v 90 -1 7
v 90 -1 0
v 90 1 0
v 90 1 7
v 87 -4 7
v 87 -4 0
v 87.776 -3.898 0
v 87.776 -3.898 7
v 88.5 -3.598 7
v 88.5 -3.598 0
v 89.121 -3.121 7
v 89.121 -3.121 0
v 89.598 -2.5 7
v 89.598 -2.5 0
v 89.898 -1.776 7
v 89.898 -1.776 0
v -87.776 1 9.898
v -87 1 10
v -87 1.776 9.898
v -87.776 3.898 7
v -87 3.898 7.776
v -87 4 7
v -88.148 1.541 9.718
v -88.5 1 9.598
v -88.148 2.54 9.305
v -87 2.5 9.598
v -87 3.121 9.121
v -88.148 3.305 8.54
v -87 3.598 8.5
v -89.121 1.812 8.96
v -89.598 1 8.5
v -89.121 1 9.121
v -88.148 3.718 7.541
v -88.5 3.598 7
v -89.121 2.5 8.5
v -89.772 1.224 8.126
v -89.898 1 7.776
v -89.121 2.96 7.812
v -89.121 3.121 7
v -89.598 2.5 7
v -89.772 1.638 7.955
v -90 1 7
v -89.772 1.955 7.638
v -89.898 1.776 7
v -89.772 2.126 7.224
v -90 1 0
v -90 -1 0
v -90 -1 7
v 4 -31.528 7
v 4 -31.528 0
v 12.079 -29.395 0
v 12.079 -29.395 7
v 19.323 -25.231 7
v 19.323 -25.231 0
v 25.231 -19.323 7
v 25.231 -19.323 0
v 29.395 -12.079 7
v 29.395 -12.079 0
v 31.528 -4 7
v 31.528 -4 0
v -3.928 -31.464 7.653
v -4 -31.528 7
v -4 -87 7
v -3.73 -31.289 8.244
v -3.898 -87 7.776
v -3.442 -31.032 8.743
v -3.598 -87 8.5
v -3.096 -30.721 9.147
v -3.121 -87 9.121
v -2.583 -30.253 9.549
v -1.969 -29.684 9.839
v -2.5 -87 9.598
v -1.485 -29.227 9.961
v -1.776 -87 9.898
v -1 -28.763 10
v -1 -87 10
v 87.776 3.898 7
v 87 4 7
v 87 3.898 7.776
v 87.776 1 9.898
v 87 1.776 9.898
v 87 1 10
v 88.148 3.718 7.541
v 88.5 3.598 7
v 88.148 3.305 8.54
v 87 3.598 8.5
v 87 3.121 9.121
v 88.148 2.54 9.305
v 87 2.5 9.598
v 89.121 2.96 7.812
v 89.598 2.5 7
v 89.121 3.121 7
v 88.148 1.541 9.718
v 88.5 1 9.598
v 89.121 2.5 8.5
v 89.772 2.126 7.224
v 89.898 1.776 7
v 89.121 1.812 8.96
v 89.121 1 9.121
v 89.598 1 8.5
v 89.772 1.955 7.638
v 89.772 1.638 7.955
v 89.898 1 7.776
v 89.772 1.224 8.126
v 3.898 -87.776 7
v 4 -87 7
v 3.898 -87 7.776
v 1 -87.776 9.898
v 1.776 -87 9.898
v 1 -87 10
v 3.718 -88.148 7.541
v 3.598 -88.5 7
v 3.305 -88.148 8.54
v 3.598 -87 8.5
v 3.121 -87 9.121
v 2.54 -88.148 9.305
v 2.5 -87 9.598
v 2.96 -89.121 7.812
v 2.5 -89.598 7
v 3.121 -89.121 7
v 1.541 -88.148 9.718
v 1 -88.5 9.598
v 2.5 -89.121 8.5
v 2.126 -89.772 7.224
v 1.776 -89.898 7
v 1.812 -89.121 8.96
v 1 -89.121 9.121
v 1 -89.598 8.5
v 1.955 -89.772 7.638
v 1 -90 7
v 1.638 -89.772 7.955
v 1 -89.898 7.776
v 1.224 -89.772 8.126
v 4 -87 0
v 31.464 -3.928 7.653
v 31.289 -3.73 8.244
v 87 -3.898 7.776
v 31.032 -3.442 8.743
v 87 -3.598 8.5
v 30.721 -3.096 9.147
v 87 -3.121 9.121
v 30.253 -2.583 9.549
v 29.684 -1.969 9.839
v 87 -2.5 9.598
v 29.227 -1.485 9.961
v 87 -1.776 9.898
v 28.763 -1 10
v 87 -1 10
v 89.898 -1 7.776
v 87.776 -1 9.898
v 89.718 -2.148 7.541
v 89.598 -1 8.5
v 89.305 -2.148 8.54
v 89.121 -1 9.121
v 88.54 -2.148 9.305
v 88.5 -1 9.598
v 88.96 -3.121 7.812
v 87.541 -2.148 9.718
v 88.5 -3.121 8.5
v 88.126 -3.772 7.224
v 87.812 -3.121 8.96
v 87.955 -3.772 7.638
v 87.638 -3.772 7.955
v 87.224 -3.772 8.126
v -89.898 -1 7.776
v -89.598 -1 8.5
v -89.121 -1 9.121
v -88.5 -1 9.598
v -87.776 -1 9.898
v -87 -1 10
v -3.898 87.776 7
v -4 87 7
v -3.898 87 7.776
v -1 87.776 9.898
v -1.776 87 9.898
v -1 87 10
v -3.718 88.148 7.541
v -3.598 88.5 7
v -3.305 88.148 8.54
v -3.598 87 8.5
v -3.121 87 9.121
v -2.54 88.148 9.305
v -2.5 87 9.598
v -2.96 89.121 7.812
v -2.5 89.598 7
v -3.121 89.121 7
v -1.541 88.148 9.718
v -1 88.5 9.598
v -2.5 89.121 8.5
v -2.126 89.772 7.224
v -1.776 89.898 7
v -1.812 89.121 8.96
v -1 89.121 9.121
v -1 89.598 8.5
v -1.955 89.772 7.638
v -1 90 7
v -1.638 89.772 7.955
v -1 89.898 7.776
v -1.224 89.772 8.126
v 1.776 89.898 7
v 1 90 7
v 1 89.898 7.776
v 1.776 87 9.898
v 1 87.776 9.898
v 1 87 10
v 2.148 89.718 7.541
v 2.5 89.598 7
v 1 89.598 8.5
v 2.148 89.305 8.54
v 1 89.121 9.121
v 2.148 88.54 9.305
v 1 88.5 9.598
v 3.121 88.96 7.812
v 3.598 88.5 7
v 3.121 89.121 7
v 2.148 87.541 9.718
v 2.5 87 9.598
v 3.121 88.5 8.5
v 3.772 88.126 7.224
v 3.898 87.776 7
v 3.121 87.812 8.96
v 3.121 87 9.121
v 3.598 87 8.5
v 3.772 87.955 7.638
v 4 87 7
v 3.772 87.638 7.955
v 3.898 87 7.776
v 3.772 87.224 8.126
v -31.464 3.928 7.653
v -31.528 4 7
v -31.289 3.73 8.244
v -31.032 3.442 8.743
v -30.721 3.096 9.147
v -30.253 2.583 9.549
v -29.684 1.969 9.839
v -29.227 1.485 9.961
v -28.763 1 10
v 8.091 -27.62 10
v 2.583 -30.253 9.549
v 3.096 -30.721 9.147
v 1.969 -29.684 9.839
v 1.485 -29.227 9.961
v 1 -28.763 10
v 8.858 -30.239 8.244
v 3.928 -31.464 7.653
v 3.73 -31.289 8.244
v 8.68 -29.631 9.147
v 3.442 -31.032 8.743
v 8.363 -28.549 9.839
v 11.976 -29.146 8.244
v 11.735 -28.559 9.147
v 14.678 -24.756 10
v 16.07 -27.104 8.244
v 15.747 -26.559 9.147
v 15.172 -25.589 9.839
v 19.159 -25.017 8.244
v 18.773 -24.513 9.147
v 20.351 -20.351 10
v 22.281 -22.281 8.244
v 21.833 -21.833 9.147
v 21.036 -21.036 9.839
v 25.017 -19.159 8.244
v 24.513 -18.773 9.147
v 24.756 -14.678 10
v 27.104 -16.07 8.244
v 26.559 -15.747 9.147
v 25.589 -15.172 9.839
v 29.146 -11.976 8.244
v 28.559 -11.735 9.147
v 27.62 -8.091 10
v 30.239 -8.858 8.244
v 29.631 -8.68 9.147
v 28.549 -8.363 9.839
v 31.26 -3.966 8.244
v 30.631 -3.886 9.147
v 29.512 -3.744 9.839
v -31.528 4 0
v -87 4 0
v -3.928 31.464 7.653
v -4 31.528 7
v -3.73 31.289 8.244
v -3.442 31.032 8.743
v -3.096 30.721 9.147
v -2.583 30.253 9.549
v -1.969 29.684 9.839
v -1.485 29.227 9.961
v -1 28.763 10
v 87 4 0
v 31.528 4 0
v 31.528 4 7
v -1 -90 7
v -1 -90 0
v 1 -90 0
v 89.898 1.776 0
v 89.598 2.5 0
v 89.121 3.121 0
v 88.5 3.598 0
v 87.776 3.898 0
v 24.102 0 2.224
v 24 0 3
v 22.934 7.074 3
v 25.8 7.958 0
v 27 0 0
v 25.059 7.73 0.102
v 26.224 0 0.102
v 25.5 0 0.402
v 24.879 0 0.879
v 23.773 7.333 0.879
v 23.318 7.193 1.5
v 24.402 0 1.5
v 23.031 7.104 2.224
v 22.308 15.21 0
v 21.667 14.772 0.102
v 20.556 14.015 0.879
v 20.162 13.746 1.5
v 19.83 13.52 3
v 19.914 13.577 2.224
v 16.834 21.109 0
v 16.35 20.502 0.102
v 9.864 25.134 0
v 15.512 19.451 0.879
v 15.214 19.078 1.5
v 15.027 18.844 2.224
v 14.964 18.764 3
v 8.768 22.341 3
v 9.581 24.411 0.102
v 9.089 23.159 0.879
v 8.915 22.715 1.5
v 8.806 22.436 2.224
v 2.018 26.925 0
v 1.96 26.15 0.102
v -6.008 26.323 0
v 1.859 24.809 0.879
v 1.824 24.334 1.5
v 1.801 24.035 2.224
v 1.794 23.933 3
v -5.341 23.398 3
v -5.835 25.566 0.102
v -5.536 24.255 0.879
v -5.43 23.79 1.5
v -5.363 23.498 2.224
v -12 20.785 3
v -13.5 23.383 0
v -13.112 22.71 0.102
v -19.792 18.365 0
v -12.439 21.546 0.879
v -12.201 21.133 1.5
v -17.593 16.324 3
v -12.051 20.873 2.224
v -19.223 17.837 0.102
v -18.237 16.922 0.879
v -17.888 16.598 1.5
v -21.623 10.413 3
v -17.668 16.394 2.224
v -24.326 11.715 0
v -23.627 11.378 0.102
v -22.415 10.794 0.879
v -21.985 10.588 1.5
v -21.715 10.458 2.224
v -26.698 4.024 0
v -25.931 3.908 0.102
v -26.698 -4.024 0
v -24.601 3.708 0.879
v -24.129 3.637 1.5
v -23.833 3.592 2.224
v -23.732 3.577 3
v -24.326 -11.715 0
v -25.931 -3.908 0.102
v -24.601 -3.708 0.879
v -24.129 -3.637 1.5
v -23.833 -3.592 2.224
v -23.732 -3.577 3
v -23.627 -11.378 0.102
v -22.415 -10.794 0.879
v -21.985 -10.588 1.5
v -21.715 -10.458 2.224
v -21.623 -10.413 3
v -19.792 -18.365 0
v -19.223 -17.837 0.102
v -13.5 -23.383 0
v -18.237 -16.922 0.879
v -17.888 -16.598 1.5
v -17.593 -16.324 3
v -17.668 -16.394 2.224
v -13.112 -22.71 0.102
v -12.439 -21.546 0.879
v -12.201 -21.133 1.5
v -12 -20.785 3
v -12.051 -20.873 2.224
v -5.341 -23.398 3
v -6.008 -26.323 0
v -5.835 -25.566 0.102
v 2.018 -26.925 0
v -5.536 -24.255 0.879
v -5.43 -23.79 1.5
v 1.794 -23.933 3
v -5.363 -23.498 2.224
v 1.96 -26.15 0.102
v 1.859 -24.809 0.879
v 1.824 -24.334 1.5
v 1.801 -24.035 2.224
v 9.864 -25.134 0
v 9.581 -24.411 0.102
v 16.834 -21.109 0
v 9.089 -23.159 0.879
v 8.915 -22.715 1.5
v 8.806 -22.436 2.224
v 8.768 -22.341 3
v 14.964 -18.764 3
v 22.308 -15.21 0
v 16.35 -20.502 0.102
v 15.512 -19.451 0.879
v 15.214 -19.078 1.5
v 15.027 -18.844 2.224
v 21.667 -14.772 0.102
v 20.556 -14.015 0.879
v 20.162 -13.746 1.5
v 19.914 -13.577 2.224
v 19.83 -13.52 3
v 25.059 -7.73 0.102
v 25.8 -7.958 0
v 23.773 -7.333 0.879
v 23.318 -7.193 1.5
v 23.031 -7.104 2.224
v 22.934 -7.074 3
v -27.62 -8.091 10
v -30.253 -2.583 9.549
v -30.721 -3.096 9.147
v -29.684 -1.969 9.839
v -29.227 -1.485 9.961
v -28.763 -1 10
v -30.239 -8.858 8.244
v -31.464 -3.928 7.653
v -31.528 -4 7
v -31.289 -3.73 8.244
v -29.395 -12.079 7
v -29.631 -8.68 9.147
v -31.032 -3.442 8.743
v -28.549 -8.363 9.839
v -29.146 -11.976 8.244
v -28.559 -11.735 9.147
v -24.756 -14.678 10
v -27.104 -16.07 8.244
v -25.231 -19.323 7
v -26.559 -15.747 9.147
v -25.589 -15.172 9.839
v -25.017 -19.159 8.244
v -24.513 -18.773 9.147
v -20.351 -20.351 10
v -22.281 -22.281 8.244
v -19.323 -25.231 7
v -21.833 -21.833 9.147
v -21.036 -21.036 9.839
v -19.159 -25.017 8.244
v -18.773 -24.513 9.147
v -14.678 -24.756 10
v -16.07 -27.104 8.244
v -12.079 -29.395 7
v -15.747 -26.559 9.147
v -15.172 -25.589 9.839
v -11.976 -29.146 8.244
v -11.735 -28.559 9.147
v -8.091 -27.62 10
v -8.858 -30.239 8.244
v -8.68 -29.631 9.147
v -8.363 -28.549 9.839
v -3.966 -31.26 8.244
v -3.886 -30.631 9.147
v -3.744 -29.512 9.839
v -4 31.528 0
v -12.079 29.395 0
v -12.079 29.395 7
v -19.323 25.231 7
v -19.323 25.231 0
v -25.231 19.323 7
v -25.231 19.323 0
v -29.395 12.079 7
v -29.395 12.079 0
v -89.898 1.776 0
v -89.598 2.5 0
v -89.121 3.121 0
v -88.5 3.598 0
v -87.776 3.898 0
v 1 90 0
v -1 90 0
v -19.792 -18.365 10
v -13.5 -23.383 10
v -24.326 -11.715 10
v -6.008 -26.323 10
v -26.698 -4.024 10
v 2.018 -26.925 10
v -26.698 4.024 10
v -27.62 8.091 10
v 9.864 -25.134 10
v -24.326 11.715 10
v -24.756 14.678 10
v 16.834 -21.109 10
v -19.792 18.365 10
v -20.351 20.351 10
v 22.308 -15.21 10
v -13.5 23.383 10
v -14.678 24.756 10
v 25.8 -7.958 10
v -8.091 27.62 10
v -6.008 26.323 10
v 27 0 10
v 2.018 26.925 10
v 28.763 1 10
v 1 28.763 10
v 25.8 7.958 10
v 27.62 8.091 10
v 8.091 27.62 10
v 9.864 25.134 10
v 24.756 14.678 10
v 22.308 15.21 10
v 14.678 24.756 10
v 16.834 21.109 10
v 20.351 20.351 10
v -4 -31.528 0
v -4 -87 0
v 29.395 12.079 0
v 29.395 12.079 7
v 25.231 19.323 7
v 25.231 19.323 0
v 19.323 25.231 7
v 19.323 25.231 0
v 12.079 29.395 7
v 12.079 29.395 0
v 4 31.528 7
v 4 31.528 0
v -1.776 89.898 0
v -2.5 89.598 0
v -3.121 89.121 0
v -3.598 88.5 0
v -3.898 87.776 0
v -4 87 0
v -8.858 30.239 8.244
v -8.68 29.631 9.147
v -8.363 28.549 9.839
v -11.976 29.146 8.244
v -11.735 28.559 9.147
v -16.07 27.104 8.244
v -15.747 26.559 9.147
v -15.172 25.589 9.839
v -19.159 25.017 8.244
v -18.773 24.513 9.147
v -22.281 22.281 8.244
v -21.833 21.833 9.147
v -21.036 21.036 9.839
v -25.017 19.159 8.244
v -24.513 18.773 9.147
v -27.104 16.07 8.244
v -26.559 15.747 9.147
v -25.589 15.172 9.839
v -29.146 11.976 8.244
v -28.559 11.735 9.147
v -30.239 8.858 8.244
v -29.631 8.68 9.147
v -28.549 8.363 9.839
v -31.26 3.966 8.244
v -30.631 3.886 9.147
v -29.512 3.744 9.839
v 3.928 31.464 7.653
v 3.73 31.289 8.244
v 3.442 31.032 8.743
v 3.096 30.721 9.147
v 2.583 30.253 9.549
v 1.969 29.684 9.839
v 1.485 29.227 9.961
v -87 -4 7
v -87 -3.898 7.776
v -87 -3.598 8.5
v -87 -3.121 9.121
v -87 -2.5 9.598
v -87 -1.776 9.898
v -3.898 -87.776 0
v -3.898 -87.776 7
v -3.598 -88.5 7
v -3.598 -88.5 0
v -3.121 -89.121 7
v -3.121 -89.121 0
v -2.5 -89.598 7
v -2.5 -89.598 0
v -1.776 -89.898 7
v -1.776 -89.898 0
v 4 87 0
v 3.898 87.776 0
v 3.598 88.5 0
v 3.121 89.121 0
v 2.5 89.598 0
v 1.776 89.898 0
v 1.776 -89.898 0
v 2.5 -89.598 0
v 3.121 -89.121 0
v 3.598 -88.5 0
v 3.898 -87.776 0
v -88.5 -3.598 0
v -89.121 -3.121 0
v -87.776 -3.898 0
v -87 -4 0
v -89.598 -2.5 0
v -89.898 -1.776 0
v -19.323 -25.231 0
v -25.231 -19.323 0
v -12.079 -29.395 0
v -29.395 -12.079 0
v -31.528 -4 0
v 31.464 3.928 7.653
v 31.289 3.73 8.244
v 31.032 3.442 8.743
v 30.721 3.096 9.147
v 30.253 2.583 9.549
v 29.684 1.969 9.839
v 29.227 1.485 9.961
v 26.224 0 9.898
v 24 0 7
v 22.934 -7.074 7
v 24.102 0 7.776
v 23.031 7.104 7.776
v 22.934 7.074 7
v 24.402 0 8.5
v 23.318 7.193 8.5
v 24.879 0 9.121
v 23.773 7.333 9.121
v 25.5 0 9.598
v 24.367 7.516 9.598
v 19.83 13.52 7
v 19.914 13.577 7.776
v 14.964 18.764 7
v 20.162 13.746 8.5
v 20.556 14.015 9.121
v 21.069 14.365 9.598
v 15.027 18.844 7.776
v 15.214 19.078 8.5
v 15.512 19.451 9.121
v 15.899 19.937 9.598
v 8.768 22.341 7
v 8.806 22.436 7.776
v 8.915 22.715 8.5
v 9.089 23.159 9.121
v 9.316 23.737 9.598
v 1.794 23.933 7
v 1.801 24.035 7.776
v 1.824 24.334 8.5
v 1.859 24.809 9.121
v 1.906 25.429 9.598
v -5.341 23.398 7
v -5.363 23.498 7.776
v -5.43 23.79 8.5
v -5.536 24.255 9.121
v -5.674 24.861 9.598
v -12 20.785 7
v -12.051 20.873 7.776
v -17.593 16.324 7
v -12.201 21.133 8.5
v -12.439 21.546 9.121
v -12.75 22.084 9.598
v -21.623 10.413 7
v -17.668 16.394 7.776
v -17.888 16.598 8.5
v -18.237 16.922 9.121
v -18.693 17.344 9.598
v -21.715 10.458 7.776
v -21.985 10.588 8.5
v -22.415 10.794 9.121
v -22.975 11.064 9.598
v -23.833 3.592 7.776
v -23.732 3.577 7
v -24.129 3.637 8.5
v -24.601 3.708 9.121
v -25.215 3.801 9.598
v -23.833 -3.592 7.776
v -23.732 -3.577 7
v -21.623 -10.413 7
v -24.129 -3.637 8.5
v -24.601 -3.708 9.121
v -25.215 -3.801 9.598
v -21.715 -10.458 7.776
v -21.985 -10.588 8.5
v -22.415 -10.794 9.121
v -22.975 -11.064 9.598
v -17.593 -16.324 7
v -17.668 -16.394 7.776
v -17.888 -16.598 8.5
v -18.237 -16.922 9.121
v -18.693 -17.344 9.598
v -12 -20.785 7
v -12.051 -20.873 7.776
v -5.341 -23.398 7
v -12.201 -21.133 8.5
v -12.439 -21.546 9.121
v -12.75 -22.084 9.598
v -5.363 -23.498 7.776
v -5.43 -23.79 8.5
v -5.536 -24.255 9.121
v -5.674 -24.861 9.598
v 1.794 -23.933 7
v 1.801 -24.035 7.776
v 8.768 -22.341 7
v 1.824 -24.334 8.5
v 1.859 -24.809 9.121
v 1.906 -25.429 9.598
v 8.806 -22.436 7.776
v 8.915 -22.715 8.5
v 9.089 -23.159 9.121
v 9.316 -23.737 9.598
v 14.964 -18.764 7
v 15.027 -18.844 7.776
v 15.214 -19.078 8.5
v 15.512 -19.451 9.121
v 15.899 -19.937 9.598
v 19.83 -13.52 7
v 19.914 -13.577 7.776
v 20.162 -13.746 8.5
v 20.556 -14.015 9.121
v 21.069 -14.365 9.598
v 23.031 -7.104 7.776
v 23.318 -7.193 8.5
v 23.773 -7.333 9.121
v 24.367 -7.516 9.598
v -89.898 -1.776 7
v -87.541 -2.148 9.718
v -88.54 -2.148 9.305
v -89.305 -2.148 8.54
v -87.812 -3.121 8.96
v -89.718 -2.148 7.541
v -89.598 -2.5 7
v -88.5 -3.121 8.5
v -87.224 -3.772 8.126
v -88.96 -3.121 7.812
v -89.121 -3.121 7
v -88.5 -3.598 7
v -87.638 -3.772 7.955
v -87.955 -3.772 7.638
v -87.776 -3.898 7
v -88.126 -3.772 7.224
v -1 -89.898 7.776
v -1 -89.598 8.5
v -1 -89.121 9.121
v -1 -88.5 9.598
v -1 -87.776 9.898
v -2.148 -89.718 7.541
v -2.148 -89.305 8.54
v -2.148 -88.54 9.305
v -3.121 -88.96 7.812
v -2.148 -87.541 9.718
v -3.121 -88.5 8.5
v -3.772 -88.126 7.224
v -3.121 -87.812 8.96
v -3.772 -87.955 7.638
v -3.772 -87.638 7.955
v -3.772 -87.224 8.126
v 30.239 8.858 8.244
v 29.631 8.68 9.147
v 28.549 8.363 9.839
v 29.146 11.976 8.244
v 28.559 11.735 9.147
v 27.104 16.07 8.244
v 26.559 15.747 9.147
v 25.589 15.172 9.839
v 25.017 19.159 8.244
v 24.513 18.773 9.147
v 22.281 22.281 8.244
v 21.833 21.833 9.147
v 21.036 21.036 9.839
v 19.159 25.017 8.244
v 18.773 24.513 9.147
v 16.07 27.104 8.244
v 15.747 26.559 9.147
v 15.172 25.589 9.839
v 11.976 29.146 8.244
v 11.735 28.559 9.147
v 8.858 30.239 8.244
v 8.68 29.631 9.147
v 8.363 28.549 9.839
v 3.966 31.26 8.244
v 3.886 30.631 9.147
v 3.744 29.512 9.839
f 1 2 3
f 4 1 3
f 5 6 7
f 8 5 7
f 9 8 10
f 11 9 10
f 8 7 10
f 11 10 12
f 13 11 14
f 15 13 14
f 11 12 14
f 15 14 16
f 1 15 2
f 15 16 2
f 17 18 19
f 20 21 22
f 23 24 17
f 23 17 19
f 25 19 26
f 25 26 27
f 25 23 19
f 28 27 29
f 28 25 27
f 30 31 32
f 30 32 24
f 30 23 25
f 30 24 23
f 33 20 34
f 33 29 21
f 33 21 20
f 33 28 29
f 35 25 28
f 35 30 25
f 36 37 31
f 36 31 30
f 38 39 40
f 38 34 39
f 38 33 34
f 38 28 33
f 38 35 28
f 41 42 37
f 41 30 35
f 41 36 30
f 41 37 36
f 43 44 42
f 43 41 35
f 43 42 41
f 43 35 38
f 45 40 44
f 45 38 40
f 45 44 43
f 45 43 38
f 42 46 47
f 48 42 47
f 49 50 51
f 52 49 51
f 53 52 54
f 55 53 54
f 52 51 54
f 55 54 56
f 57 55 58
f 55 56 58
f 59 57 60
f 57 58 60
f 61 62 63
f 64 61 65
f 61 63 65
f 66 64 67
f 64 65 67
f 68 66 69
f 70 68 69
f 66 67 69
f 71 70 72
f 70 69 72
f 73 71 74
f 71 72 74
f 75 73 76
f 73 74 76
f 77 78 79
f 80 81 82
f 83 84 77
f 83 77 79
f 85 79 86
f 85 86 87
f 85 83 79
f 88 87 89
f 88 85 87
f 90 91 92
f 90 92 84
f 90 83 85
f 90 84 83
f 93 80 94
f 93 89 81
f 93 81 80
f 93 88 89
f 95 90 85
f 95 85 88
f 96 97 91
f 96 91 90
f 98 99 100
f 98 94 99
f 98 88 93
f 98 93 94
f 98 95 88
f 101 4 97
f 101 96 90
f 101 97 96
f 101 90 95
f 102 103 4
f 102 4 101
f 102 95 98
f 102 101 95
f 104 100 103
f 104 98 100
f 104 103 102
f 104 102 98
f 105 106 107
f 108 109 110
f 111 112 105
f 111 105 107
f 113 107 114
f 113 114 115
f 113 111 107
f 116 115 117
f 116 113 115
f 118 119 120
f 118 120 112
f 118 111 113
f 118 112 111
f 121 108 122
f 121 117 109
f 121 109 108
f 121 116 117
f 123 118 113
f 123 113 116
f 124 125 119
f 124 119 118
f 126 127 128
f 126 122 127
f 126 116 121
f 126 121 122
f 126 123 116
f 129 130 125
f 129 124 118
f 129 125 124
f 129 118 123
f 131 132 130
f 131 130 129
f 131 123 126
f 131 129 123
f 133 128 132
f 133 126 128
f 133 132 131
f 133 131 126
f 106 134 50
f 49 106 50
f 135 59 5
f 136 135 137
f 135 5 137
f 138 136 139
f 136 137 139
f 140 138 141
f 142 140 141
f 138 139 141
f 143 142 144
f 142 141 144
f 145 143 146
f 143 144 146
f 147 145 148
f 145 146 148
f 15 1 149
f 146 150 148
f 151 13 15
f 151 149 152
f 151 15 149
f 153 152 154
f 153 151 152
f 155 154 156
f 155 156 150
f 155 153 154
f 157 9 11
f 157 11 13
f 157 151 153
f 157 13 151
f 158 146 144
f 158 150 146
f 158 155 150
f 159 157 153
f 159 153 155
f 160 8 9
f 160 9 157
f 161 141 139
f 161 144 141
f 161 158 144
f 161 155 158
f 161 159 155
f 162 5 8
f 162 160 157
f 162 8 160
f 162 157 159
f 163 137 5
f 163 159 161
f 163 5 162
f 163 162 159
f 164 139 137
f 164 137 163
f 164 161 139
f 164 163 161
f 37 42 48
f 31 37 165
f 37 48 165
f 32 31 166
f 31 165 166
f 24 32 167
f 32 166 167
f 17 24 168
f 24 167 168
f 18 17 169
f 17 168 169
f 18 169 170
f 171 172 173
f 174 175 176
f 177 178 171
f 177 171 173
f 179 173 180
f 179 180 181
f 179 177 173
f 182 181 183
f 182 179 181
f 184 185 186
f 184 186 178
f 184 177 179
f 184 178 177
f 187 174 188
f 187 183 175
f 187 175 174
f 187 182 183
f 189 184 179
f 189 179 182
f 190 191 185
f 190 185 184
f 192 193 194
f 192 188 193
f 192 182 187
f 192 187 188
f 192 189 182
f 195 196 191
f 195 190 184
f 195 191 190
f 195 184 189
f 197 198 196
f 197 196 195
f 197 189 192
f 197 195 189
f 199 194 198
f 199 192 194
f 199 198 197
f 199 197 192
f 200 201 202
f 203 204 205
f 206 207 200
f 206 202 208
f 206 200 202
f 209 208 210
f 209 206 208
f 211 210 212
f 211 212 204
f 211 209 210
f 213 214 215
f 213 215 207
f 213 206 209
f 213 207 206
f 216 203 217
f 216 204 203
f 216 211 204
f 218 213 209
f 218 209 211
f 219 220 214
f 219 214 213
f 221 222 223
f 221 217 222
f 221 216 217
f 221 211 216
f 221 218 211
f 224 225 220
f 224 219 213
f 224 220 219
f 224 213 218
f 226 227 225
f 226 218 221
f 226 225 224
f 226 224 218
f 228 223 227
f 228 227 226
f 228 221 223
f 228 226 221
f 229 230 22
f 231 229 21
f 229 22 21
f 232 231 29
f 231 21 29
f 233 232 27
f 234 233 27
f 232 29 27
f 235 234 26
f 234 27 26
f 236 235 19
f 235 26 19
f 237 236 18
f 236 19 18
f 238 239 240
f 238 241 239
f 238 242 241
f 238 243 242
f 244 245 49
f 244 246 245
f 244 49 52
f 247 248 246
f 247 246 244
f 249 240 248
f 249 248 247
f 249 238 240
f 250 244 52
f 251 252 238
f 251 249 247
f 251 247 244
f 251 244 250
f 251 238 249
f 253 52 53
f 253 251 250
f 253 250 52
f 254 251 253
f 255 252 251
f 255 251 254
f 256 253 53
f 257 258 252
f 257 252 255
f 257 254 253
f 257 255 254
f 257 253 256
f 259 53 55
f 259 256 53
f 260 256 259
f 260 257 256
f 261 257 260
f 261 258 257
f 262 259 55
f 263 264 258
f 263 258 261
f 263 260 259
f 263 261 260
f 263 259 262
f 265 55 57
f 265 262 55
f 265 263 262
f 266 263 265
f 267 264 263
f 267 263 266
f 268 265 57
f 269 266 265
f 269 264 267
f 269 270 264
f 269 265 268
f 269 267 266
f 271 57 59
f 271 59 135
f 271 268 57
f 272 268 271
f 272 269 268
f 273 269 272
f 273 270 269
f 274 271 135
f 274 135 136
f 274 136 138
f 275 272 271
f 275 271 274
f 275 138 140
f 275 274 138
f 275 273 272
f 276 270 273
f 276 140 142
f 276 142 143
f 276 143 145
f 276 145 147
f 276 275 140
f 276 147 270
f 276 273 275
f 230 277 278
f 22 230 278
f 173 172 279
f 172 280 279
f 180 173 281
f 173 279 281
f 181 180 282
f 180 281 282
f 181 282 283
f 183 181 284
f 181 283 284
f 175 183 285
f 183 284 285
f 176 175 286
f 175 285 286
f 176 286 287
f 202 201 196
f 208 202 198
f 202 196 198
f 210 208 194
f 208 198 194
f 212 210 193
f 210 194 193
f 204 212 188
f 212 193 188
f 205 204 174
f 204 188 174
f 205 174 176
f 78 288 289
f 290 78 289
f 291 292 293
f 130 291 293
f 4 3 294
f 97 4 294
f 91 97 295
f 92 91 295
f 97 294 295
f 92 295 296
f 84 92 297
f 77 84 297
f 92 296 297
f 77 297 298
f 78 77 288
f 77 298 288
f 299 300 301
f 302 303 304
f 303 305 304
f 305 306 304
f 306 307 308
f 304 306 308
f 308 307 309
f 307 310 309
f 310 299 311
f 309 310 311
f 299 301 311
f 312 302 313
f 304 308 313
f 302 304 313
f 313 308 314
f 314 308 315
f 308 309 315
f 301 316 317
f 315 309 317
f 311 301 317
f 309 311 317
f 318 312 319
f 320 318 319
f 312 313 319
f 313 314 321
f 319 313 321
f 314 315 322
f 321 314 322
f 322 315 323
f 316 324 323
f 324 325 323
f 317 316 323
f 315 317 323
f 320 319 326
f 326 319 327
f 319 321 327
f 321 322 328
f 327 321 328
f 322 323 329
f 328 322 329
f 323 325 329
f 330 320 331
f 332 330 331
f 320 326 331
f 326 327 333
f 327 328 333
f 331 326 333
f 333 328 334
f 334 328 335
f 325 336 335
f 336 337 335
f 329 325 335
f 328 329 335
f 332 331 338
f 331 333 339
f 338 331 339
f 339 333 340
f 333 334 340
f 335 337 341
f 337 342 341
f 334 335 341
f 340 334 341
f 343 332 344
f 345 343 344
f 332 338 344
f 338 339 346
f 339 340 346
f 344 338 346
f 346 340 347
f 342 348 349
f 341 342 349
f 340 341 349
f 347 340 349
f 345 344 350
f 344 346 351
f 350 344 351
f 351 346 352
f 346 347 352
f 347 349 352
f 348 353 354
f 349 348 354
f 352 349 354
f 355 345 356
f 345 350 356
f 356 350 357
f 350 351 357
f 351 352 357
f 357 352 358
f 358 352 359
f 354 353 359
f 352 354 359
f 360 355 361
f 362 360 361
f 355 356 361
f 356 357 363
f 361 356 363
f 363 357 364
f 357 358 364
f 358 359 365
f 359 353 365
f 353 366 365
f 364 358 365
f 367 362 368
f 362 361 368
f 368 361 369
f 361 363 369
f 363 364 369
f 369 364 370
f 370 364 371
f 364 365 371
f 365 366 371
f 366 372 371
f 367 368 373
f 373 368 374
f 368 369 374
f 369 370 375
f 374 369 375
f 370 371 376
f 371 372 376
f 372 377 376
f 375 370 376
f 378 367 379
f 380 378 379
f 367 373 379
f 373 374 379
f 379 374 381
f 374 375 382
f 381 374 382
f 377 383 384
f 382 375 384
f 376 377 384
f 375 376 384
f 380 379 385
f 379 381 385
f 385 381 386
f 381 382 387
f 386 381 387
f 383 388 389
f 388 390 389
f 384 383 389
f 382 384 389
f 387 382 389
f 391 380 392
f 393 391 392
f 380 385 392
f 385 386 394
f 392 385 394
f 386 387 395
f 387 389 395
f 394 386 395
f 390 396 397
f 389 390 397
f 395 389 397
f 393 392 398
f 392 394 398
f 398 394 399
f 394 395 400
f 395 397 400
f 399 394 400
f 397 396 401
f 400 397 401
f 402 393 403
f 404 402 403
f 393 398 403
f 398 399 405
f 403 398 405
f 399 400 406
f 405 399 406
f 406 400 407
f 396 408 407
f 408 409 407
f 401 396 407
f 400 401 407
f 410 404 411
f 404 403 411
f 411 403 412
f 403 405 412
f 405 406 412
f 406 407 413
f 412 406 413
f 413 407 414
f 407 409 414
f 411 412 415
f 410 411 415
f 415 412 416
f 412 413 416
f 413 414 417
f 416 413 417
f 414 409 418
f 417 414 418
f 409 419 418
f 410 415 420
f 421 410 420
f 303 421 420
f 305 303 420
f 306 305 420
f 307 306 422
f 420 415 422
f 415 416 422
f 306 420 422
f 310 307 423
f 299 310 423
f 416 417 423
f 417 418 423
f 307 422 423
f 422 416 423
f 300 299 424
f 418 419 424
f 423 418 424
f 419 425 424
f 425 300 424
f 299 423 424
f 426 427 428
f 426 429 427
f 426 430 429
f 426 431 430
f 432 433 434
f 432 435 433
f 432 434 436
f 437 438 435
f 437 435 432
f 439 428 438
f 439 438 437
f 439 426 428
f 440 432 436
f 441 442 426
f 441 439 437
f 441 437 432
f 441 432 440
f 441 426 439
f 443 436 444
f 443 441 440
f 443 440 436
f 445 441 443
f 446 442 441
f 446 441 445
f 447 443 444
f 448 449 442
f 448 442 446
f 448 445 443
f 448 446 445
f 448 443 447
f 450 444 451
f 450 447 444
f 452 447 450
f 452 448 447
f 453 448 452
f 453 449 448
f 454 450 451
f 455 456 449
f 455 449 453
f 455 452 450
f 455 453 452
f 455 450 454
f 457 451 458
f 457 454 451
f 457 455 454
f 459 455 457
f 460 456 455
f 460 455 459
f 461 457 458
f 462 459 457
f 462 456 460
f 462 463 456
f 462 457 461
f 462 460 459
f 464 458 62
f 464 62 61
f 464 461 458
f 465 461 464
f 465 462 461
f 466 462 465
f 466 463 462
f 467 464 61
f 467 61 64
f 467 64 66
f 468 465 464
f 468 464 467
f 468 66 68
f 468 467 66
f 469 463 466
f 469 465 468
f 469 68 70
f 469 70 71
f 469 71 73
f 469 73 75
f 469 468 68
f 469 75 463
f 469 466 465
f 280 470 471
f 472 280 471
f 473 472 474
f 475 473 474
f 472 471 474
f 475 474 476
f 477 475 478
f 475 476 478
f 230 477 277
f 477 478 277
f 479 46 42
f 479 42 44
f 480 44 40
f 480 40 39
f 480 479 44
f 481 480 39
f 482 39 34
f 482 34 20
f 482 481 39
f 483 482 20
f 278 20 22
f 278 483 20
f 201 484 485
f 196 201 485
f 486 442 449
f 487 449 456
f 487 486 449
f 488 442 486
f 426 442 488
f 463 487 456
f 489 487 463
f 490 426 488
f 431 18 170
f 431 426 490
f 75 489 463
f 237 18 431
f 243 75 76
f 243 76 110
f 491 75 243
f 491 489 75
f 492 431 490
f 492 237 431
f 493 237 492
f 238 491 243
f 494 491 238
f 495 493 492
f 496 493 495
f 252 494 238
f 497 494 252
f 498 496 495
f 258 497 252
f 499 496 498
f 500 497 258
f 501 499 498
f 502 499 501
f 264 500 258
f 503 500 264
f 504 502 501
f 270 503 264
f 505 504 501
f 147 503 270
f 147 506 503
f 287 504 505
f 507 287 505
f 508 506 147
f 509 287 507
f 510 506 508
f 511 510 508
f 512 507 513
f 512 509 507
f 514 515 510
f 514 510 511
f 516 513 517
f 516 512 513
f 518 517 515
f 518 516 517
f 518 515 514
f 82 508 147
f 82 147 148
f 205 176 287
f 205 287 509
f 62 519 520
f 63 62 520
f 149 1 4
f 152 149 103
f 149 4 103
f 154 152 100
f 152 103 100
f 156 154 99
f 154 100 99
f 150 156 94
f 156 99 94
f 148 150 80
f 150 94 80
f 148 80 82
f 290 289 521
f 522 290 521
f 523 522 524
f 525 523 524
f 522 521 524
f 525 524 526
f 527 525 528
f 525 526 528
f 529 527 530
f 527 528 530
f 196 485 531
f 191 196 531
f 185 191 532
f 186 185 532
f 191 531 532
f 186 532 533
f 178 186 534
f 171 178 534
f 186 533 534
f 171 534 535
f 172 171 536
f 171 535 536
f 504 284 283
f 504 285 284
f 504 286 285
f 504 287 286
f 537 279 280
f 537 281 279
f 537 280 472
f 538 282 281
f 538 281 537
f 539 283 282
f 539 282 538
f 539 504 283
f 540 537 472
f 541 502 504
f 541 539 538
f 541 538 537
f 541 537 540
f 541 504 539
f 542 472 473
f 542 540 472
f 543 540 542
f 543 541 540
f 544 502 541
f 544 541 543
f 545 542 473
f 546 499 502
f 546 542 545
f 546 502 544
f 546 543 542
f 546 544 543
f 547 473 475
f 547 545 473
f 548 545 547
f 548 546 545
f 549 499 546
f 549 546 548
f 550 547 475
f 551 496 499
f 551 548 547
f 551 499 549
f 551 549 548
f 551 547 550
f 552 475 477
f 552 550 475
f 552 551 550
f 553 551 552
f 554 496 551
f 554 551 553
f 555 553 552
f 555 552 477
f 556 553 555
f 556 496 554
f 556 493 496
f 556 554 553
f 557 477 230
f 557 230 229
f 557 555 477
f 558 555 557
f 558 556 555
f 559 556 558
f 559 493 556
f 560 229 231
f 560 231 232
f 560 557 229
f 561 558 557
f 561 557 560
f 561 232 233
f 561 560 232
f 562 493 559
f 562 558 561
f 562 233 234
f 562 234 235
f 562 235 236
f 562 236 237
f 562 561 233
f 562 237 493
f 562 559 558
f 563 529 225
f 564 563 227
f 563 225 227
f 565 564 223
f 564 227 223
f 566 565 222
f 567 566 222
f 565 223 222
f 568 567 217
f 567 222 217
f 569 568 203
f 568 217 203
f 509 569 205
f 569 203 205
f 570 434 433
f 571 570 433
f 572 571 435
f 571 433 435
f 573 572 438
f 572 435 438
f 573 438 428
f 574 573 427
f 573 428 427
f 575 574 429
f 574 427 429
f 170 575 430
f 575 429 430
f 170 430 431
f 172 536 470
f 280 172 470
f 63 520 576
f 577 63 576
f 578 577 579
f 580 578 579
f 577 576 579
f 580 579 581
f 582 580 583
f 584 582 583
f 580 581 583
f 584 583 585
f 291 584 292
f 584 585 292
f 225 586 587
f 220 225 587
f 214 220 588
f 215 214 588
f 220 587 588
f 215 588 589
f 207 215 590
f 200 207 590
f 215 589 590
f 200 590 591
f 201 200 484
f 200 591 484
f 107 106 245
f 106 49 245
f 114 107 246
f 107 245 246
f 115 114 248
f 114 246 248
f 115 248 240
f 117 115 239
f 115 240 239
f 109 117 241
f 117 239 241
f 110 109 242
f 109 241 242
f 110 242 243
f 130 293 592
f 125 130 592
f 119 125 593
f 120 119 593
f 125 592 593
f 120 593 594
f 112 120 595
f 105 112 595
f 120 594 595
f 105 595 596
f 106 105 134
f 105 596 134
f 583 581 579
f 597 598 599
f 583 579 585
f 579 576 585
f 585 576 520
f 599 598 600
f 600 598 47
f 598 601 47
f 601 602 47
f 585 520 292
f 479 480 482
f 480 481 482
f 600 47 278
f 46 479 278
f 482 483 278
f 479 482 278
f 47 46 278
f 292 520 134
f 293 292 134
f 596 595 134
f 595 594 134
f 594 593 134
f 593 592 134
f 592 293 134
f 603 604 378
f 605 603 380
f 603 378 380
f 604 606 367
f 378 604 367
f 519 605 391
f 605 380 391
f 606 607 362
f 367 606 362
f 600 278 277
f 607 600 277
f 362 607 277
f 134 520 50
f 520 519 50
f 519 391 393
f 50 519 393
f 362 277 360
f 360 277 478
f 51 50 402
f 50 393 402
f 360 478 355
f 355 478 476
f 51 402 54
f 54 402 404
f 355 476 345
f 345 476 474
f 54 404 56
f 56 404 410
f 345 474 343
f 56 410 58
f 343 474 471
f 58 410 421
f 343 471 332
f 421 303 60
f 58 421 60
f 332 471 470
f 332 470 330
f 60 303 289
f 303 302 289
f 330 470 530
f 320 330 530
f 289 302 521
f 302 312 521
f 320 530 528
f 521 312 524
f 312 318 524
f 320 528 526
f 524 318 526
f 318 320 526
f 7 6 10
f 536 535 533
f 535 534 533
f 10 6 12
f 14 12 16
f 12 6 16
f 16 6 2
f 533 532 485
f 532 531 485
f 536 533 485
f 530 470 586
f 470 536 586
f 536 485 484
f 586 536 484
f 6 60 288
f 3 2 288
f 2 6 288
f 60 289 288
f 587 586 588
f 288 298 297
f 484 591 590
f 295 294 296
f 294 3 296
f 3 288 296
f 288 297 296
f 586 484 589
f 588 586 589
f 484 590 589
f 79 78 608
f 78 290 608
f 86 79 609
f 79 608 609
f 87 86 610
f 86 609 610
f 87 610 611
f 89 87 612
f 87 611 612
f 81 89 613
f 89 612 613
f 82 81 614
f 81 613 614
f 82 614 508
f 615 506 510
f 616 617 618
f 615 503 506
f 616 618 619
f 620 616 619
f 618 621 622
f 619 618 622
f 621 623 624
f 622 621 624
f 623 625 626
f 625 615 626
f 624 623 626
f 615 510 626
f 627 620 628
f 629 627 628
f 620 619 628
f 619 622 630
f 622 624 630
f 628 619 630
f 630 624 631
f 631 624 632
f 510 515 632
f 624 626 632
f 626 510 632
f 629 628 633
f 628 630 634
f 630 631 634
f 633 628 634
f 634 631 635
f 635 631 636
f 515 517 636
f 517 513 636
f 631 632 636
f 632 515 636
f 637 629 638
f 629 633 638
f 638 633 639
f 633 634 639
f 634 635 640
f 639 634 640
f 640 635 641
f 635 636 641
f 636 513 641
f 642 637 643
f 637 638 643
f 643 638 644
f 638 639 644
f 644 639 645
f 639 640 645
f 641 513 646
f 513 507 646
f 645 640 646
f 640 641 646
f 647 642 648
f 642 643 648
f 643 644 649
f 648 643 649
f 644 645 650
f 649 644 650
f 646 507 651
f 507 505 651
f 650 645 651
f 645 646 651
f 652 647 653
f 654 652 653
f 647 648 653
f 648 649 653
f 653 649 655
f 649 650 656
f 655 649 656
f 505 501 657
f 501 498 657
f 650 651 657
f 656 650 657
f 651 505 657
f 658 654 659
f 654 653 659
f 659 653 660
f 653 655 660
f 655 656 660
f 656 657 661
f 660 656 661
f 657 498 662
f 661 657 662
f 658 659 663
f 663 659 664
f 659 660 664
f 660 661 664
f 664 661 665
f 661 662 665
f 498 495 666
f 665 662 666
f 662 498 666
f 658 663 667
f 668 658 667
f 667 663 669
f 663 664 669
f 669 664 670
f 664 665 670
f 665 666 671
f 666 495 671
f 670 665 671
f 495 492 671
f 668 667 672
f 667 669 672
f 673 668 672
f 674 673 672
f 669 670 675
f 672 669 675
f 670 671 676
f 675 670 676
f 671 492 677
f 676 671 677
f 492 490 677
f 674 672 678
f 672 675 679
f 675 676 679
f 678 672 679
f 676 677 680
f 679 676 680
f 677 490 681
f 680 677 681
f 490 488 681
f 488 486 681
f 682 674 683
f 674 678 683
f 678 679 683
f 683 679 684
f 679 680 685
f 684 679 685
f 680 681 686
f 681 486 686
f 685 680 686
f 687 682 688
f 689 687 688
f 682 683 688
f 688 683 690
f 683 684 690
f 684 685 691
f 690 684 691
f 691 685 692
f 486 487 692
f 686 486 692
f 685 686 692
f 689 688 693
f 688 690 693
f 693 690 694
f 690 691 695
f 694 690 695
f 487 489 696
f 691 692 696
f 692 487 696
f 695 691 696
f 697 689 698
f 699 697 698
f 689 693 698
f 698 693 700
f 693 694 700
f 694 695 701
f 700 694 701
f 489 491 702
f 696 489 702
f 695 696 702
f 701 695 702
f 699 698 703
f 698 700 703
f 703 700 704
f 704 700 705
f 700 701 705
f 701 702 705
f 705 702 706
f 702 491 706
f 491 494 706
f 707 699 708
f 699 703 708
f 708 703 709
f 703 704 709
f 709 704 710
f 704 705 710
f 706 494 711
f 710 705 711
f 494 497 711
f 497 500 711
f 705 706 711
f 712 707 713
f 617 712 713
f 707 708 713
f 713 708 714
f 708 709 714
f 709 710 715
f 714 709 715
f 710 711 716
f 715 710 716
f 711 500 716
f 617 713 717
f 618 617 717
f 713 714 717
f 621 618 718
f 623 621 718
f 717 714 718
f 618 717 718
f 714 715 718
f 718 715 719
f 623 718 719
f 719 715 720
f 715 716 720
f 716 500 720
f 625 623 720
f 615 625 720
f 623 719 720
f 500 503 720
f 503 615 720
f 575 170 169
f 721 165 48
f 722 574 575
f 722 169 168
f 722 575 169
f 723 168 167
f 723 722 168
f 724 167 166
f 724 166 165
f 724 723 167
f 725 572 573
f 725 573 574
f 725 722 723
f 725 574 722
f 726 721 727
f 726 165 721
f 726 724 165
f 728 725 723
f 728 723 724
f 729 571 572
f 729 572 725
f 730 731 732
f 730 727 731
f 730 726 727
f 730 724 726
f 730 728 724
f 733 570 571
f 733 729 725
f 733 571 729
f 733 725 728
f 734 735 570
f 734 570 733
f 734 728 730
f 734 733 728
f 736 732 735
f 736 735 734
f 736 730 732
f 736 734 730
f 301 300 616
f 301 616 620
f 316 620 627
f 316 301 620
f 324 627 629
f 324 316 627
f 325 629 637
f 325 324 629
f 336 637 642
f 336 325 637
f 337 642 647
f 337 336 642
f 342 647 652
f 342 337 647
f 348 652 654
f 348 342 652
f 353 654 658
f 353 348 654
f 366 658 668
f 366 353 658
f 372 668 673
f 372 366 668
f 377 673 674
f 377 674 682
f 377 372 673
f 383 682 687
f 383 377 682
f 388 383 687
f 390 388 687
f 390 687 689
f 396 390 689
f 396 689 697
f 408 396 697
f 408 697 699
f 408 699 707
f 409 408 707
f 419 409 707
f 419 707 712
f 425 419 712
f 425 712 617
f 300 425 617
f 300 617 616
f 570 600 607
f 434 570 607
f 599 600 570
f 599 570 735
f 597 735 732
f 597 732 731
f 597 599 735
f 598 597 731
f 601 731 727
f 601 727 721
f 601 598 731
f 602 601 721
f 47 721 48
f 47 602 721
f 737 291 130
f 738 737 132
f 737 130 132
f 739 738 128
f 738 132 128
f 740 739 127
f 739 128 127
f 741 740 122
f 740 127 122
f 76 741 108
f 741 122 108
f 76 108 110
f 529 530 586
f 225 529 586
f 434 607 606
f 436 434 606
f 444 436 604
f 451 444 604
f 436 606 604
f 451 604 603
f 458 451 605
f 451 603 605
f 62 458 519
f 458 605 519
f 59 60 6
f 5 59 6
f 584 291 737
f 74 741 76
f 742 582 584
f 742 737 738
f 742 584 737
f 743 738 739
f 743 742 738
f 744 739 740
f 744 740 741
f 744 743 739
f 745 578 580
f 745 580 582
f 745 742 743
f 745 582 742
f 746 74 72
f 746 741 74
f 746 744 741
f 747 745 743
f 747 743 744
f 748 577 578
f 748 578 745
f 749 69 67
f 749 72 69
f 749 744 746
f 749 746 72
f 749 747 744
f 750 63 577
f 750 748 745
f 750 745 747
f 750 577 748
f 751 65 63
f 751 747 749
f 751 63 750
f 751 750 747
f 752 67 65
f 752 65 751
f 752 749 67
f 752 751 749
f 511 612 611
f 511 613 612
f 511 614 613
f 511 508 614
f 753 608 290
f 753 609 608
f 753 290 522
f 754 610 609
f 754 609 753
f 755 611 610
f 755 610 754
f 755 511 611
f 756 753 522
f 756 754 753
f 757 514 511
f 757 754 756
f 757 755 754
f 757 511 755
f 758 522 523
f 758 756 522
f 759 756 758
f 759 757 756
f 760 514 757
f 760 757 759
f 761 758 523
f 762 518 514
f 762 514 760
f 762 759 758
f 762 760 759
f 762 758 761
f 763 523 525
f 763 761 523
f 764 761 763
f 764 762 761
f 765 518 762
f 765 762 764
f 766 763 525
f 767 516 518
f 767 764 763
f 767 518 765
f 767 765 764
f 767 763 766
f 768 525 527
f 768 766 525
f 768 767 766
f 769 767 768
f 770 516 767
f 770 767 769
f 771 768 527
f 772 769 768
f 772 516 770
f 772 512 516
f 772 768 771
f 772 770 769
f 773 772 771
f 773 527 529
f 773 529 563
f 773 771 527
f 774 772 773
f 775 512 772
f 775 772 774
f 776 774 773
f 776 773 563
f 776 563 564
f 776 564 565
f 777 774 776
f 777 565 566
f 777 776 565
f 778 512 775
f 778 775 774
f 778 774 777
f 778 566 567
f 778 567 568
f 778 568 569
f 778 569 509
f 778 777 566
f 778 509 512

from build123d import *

# Parameters (mm, degrees)
F0_R         = 24
F1_DEPTH     = 10
F2_R         = 3
F3_T1_DEPTH  = 14.5
F3_S5_W      = 3
F3_S5_H      = 3
F3_T6_DEPTH  = 3
F3_S11_W     = 3
F3_S11_H     = 3
F3_T12_DEPTH = 3
F3_S17_W     = 3
F3_S17_H     = 3
F3_T18_DEPTH = 3
F3_S23_W     = 3
F3_S23_H     = 3
F3_T24_DEPTH = 3
F3_S29_W     = 3
F3_S29_H     = 3
F3_T30_DEPTH = 3
F3_S35_W     = 3
F3_S35_H     = 3
F3_T36_DEPTH = 3
F3_S41_W     = 3
F3_S41_H     = 3
F3_T42_DEPTH = 3
F3_S47_W     = 3
F3_S47_H     = 3
F3_T48_DEPTH = 3


# Not quite as in the source:
# - a fillet or chamfer that OpenCascade refuses, or shapes differently, is made with other operations: its cross-section is extruded or revolved along the edge and cut away or added


with BuildPart() as f1:
    # F0 (on Top) → F1 (new body)
    with BuildSketch(Plane.XY):
        with BuildLine():
            Line((31.5276851761, -4), (90, -4))
            Line((90, -4), (90, 4))
            Line((90, 4), (31.5276851761, 4))
            ThreePointArc((31.5276851761, 4), (22.4721486797, 22.4721486797), (4, 31.5276851761))
            Line((4, 31.5276851761), (4, 90))
            Line((4, 90), (-4, 90))
            Line((-4, 90), (-4, 31.5276851761))
            ThreePointArc((-4, 31.5276851761), (-22.4721486797, 22.4721486797), (-31.5276851761, 4))
            Line((-31.5276851761, 4), (-90, 4))
            Line((-90, 4), (-90, -4))
            Line((-90, -4), (-31.5276851761, -4))
            ThreePointArc((-31.5276851761, -4), (-22.4721486797, -22.4721486797), (-4, -31.5276851761))
            Line((-4, -31.5276851761), (-4, -90))
            Line((-4, -90), (4, -90))
            Line((4, -90), (4, -31.5276851761))
            ThreePointArc((4, -31.5276851761), (22.4721486797, -22.4721486797), (31.5276851761, -4))
        make_face()
        Circle(F0_R, mode=Mode.SUBTRACT)
    extrude(amount=F1_DEPTH)

    # F2
    f2_edges = [f1.edges().sort_by_distance(p)[0] for p in [
        (-22.472149, -22.472149, 10),
        (-4, -60.763843, 10),
        (0, -90, 10),
        (4, -60.763843, 10),
        (22.472149, -22.472149, 10),
        (60.763843, -4, 10),
        (90, 0, 10),
        (60.763843, 4, 10),
        (22.472149, 22.472149, 10),
        (4, 60.763843, 10),
        (0, 90, 10),
        (-4, 60.763843, 10),
        (-22.472149, 22.472149, 10),
        (-60.763843, 4, 10),
        (-90, 0, 10),
        (-60.763843, -4, 10),
        (-24, 0, 10),
    ]]
    fillet(f2_edges, radius=F2_R)

    # F3: fillet of radius 3 on 9 edges, made by hand

    # F3_s2 → F3_t1 (cut)
    with BuildSketch(Plane.XY.offset(-7.5)):
        with BuildLine():
            ThreePointArc((-87, -4), (-89.1213203436, -3.1213203436), (-90, -1))
            Line((-90, -1), (-90, -4))
            Line((-90, -4), (-87, -4))
        make_face()
        with BuildLine():
            ThreePointArc((-90, 1), (-89.1213203436, 3.1213203436), (-87, 4))
            Line((-87, 4), (-90, 4))
            Line((-90, 4), (-90, 1))
        make_face()
        with BuildLine():
            ThreePointArc((1, -90), (3.1213203436, -89.1213203436), (4, -87))
            Line((4, -87), (4, -90))
            Line((4, -90), (1, -90))
        make_face()
        with BuildLine():
            ThreePointArc((-4, -87), (-3.1213203436, -89.1213203436), (-1, -90))
            Line((-1, -90), (-4, -90))
            Line((-4, -90), (-4, -87))
        make_face()
        with BuildLine():
            ThreePointArc((87, -4), (89.1213203436, -3.1213203436), (90, -1))
            Line((90, -1), (90, -4))
            Line((90, -4), (87, -4))
        make_face()
        with BuildLine():
            ThreePointArc((90, 1), (89.1213203436, 3.1213203436), (87, 4))
            Line((87, 4), (90, 4))
            Line((90, 4), (90, 1))
        make_face()
        with BuildLine():
            ThreePointArc((4, 87), (3.1213203436, 89.1213203436), (1, 90))
            Line((1, 90), (4, 90))
            Line((4, 90), (4, 87))
        make_face()
        with BuildLine():
            ThreePointArc((-1, 90), (-3.1213203436, 89.1213203436), (-4, 87))
            Line((-4, 87), (-4, 90))
            Line((-4, 90), (-1, 90))
        make_face()
    extrude(amount=F3_T1_DEPTH, mode=Mode.SUBTRACT)


with BuildPart() as f3_tool4:
    # F3_s5 → F3_t6 (new body)
    with BuildSketch(Plane.XZ.offset(-87)):
        with Locations((-2.5, 8.5)):
            Rectangle(F3_S5_W, F3_S5_H)
    extrude(amount=-F3_T6_DEPTH)

    # F3_s7 → F3_t8 (revolve, cut)
    with BuildSketch(Plane(origin=(-1, 87, 7), x_dir=(0.7071067812, 0, -0.7071067812), z_dir=(0.7071067812, 0, 0.7071067812))):
        with BuildLine():
            ThreePointArc((0, -3), (3, 0), (0, 3))
            Line((0, 3), (0, -3))
        make_face()
    revolve(axis=Axis((-1, 87, 7), (0, 1, 0)), mode=Mode.SUBTRACT)


with BuildPart() as f1_1:
    add(f1.part)

    # F3_t3: cut F3_tool4
    add(f3_tool4.part, mode=Mode.SUBTRACT)


with BuildPart() as f3_tool10:
    # F3_s11 → F3_t12 (new body)
    with BuildSketch(Plane.YZ.offset(1)):
        with Locations((88.5, 8.5)):
            Rectangle(F3_S11_W, F3_S11_H)
    extrude(amount=F3_T12_DEPTH)

    # F3_s13 → F3_t14 (revolve, cut)
    with BuildSketch(Plane(origin=(1, 87, 7), x_dir=(0, -0.7071067812, -0.7071067812), z_dir=(0, -0.7071067812, 0.7071067812))):
        with BuildLine():
            ThreePointArc((0, -3), (3, 0), (0, 3))
            Line((0, 3), (0, -3))
        make_face()
    revolve(axis=Axis((1, 87, 7), (1, 0, 0)), mode=Mode.SUBTRACT)


with BuildPart() as f1_2:
    add(f1_1.part)

    # F3_t9: cut F3_tool10
    add(f3_tool10.part, mode=Mode.SUBTRACT)


with BuildPart() as f3_tool16:
    # F3_s17 → F3_t18 (new body)
    with BuildSketch(Plane.YZ.offset(87)):
        with Locations((2.5, 8.5)):
            Rectangle(F3_S17_W, F3_S17_H)
    extrude(amount=F3_T18_DEPTH)

    # F3_s19 → F3_t20 (revolve, cut)
    with BuildSketch(Plane(origin=(87, 1, 7), x_dir=(0, -0.7071067812, -0.7071067812), z_dir=(0, -0.7071067812, 0.7071067812))):
        with BuildLine():
            ThreePointArc((0, -3), (3, 0), (0, 3))
            Line((0, 3), (0, -3))
        make_face()
    revolve(axis=Axis((87, 1, 7), (1, 0, 0)), mode=Mode.SUBTRACT)


with BuildPart() as f1_3:
    add(f1_2.part)

    # F3_t15: cut F3_tool16
    add(f3_tool16.part, mode=Mode.SUBTRACT)


with BuildPart() as f3_tool22:
    # F3_s23 → F3_t24 (new body)
    with BuildSketch(Plane.XZ.offset(1)):
        with Locations((88.5, 8.5)):
            Rectangle(F3_S23_W, F3_S23_H)
    extrude(amount=F3_T24_DEPTH)

    # F3_s25 → F3_t26 (revolve, cut)
    with BuildSketch(Plane(origin=(87, -1, 7), x_dir=(-0.7071067812, 0, -0.7071067812), z_dir=(-0.7071067812, 0, 0.7071067812))):
        with BuildLine():
            ThreePointArc((0, -3), (3, 0), (0, 3))
            Line((0, 3), (0, -3))
        make_face()
    revolve(axis=Axis((87, -1, 7), (0, -1, 0)), mode=Mode.SUBTRACT)


with BuildPart() as f1_4:
    add(f1_3.part)

    # F3_t21: cut F3_tool22
    add(f3_tool22.part, mode=Mode.SUBTRACT)


with BuildPart() as f3_tool28:
    # F3_s29 → F3_t30 (new body)
    with BuildSketch(Plane.YZ.offset(-1)):
        with Locations((-88.5, 8.5)):
            Rectangle(F3_S29_W, F3_S29_H)
    extrude(amount=-F3_T30_DEPTH)

    # F3_s31 → F3_t32 (revolve, cut)
    with BuildSketch(Plane(origin=(-1, -87, 7), x_dir=(0, 0.7071067812, -0.7071067812), z_dir=(0, 0.7071067812, 0.7071067812))):
        with BuildLine():
            ThreePointArc((0, -3), (3, 0), (0, 3))
            Line((0, 3), (0, -3))
        make_face()
    revolve(axis=Axis((-1, -87, 7), (-1, 0, 0)), mode=Mode.SUBTRACT)


with BuildPart() as f1_5:
    add(f1_4.part)

    # F3_t27: cut F3_tool28
    add(f3_tool28.part, mode=Mode.SUBTRACT)


with BuildPart() as f3_tool34:
    # F3_s35 → F3_t36 (new body)
    with BuildSketch(Plane.XZ.offset(87)):
        with Locations((2.5, 8.5)):
            Rectangle(F3_S35_W, F3_S35_H)
    extrude(amount=F3_T36_DEPTH)

    # F3_s37 → F3_t38 (revolve, cut)
    with BuildSketch(Plane(origin=(1, -87, 7), x_dir=(-0.7071067812, 0, -0.7071067812), z_dir=(-0.7071067812, 0, 0.7071067812))):
        with BuildLine():
            ThreePointArc((0, -3), (3, 0), (0, 3))
            Line((0, 3), (0, -3))
        make_face()
    revolve(axis=Axis((1, -87, 7), (0, -1, 0)), mode=Mode.SUBTRACT)


with BuildPart() as f1_6:
    add(f1_5.part)

    # F3_t33: cut F3_tool34
    add(f3_tool34.part, mode=Mode.SUBTRACT)


with BuildPart() as f3_tool40:
    # F3_s41 → F3_t42 (new body)
    with BuildSketch(Plane.YZ.offset(-87)):
        with Locations((2.5, 8.5)):
            Rectangle(F3_S41_W, F3_S41_H)
    extrude(amount=-F3_T42_DEPTH)

    # F3_s43 → F3_t44 (revolve, cut)
    with BuildSketch(Plane(origin=(-87, 1, 7), x_dir=(0, -0.7071067812, -0.7071067812), z_dir=(0, 0.7071067812, -0.7071067812))):
        with BuildLine():
            ThreePointArc((0, -3), (3, 0), (0, 3))
            Line((0, 3), (0, -3))
        make_face()
    revolve(axis=Axis((-87, 1, 7), (-1, 0, 0)), mode=Mode.SUBTRACT)


with BuildPart() as f1_7:
    add(f1_6.part)

    # F3_t39: cut F3_tool40
    add(f3_tool40.part, mode=Mode.SUBTRACT)


with BuildPart() as f3_tool46:
    # F3_s47 → F3_t48 (new body)
    with BuildSketch(Plane.XZ.offset(1)):
        with Locations((-88.5, 8.5)):
            Rectangle(F3_S47_W, F3_S47_H)
    extrude(amount=F3_T48_DEPTH)

    # F3_s49 → F3_t50 (revolve, cut)
    with BuildSketch(Plane(origin=(-87, -1, 7), x_dir=(0.7071067812, 0, -0.7071067812), z_dir=(-0.7071067812, 0, -0.7071067812))):
        with BuildLine():
            ThreePointArc((0, -3), (3, 0), (0, 3))
            Line((0, 3), (0, -3))
        make_face()
    revolve(axis=Axis((-87, -1, 7), (0, -1, 0)), mode=Mode.SUBTRACT)


with BuildPart() as f1_8:
    add(f1_7.part)

    # F3_t45: cut F3_tool46
    add(f3_tool46.part, mode=Mode.SUBTRACT)

    # F3_s51 → F3_t52 (revolve, cut)
    with BuildSketch(Plane.XZ):
        with BuildLine():
            ThreePointArc((27, 0), (24.8786796564, 0.8786796564), (24, 3))
            Line((24, 3), (24, 0))
            Line((24, 0), (27, 0))
        make_face()
    revolve(axis=Axis((0, 0, 0), (0, 0, 1)), mode=Mode.SUBTRACT)


solid = f1_8.part
